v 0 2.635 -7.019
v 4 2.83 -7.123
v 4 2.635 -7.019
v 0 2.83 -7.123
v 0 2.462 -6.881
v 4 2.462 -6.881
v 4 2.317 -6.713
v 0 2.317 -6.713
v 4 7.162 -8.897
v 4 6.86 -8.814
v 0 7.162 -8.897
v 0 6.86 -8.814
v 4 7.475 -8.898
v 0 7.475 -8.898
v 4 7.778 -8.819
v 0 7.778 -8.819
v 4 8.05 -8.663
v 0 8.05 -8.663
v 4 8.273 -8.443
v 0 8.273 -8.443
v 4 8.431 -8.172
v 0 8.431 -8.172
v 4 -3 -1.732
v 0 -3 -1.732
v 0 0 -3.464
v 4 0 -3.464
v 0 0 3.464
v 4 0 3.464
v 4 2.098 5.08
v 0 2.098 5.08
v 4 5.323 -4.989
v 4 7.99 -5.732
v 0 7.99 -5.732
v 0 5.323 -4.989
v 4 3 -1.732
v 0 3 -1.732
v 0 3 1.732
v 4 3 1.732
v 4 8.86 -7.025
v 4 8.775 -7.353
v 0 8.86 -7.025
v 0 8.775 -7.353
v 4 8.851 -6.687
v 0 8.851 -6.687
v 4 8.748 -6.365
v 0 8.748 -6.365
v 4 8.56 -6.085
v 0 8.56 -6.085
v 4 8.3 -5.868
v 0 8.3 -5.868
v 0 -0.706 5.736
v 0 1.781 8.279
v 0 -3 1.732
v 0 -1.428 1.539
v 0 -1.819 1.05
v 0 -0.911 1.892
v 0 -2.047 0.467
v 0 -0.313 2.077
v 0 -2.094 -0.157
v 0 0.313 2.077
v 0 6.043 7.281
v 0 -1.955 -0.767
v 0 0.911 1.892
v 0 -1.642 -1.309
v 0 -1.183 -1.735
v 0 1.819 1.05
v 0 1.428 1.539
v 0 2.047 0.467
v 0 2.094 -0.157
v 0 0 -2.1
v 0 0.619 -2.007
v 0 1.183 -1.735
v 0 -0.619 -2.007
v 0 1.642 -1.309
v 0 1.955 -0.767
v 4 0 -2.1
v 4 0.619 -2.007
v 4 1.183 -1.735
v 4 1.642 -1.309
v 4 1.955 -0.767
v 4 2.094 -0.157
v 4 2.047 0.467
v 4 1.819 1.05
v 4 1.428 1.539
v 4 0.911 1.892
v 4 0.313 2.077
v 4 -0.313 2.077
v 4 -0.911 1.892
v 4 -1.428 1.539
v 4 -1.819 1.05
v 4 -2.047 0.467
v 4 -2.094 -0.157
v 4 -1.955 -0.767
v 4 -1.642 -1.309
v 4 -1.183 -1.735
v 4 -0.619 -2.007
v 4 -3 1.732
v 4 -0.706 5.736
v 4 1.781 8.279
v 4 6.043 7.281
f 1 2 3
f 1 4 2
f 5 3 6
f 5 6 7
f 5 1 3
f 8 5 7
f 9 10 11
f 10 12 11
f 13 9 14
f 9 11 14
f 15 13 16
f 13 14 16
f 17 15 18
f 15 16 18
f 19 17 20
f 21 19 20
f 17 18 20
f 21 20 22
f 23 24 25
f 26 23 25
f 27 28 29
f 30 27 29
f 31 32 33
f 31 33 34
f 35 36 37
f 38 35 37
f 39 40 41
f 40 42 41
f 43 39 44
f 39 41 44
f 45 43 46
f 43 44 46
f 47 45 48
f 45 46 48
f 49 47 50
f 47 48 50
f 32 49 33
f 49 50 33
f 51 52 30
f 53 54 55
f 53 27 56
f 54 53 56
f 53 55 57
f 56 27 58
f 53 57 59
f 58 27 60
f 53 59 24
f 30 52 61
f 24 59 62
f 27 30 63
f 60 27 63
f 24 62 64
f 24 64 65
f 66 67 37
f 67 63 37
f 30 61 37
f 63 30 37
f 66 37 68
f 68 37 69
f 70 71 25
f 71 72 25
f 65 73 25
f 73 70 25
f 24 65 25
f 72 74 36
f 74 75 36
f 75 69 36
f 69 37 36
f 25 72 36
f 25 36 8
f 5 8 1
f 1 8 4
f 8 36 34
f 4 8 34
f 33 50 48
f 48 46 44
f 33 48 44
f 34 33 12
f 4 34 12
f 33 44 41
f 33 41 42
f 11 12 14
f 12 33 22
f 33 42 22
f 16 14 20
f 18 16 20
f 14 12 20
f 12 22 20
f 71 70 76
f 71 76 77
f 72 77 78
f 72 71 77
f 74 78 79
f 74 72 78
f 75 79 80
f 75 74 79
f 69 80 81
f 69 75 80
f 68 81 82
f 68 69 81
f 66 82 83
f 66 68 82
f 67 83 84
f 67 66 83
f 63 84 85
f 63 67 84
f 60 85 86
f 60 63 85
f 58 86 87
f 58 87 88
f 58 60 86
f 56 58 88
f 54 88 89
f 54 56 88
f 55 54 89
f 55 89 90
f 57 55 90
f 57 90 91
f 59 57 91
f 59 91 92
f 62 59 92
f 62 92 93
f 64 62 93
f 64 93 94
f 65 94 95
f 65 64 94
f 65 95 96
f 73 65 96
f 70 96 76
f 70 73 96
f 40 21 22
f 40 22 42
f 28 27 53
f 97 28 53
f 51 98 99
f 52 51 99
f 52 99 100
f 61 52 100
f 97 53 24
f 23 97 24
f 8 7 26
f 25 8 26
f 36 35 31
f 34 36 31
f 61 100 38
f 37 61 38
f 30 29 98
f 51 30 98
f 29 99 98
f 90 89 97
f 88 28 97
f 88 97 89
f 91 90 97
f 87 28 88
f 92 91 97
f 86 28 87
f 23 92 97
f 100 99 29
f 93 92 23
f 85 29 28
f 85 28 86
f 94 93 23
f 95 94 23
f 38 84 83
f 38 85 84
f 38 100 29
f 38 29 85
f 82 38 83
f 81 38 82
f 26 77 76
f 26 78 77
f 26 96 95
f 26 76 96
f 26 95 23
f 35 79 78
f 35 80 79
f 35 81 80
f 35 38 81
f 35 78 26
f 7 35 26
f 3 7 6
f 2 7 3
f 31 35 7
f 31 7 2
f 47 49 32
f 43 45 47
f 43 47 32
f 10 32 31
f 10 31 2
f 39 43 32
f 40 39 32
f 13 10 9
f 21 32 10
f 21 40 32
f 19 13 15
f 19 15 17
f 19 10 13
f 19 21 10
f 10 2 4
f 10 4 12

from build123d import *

# Parameters (mm, degrees)
CROQUIS1_R              = 2.1
SALIENTE_EXTRUIR1_DEPTH = 4
SALIENTE_EXTRUIR2_DEPTH = 4
SALIENTE_EXTRUIR3_DEPTH = 4
SALIENTE_EXTRUIR4_DEPTH = 4
REDONDEO1_R             = 1.2


with BuildPart() as part:
    # Croquis1 → Saliente-Extruir1 (new body)
    with BuildSketch(Plane(origin=(0, 0, 0), x_dir=(0, 0, -1), z_dir=(1, 0, 0))):
        Polygon((3.464101615, 0), (1.732050808, 3), (-1.732050808, 3), (-3.464101615, 0), (-1.732050808, -3), (1.732050808, -3), align=None)
        Circle(CROQUIS1_R, mode=Mode.SUBTRACT)
    extrude(amount=SALIENTE_EXTRUIR1_DEPTH)

    # Croquis2 → Saliente-Extruir2 (add, through all)
    with BuildSketch(Plane(origin=(4, 0, 0), x_dir=(0, 0, -1), z_dir=(1, 0, 0))):
        Polygon((6.990847349, 2.515265858), (3.464101615, 0), (1.732050808, 3), (4.988660177, 5.322605307), align=None)
    extrude(amount=-SALIENTE_EXTRUIR2_DEPTH)

    # Croquis12 → Saliente-Extruir3 (add, through all)
    with BuildSketch(Plane(origin=(4, 0, 0), x_dir=(0, 0, -1), z_dir=(1, 0, 0))):
        Polygon((-7.281299997, 6.043148081), (-1.732050808, 3), (-3.464101615, 0), (-5.080008932, 2.097632781), (-5.736212746, -0.706387852), (-8.278793458, 1.780764673), align=None)
    extrude(amount=-SALIENTE_EXTRUIR3_DEPTH)

    # Croquis13 → Saliente-Extruir4 (add, through all)
    with BuildSketch(Plane(origin=(4, 0, 0), x_dir=(0, 0, -1), z_dir=(1, 0, 0))):
        Polygon((6.990847349, 2.515265858), (9.278705783, 7.966164247), (6.097551134, 9.301362773), (4.988660177, 5.322605307), align=None)
    extrude(amount=-SALIENTE_EXTRUIR4_DEPTH)

    # Redondeo1
    redondeo1_edges = [part.edges().sort_by_distance(p)[0] for p in [
        (2, 2.515265858, -6.990847349),
        (2, 9.301362773, -6.097551134),
        (2, 7.966164247, -9.278705783),
    ]]
    fillet(redondeo1_edges, radius=REDONDEO1_R)


solid = part.part
